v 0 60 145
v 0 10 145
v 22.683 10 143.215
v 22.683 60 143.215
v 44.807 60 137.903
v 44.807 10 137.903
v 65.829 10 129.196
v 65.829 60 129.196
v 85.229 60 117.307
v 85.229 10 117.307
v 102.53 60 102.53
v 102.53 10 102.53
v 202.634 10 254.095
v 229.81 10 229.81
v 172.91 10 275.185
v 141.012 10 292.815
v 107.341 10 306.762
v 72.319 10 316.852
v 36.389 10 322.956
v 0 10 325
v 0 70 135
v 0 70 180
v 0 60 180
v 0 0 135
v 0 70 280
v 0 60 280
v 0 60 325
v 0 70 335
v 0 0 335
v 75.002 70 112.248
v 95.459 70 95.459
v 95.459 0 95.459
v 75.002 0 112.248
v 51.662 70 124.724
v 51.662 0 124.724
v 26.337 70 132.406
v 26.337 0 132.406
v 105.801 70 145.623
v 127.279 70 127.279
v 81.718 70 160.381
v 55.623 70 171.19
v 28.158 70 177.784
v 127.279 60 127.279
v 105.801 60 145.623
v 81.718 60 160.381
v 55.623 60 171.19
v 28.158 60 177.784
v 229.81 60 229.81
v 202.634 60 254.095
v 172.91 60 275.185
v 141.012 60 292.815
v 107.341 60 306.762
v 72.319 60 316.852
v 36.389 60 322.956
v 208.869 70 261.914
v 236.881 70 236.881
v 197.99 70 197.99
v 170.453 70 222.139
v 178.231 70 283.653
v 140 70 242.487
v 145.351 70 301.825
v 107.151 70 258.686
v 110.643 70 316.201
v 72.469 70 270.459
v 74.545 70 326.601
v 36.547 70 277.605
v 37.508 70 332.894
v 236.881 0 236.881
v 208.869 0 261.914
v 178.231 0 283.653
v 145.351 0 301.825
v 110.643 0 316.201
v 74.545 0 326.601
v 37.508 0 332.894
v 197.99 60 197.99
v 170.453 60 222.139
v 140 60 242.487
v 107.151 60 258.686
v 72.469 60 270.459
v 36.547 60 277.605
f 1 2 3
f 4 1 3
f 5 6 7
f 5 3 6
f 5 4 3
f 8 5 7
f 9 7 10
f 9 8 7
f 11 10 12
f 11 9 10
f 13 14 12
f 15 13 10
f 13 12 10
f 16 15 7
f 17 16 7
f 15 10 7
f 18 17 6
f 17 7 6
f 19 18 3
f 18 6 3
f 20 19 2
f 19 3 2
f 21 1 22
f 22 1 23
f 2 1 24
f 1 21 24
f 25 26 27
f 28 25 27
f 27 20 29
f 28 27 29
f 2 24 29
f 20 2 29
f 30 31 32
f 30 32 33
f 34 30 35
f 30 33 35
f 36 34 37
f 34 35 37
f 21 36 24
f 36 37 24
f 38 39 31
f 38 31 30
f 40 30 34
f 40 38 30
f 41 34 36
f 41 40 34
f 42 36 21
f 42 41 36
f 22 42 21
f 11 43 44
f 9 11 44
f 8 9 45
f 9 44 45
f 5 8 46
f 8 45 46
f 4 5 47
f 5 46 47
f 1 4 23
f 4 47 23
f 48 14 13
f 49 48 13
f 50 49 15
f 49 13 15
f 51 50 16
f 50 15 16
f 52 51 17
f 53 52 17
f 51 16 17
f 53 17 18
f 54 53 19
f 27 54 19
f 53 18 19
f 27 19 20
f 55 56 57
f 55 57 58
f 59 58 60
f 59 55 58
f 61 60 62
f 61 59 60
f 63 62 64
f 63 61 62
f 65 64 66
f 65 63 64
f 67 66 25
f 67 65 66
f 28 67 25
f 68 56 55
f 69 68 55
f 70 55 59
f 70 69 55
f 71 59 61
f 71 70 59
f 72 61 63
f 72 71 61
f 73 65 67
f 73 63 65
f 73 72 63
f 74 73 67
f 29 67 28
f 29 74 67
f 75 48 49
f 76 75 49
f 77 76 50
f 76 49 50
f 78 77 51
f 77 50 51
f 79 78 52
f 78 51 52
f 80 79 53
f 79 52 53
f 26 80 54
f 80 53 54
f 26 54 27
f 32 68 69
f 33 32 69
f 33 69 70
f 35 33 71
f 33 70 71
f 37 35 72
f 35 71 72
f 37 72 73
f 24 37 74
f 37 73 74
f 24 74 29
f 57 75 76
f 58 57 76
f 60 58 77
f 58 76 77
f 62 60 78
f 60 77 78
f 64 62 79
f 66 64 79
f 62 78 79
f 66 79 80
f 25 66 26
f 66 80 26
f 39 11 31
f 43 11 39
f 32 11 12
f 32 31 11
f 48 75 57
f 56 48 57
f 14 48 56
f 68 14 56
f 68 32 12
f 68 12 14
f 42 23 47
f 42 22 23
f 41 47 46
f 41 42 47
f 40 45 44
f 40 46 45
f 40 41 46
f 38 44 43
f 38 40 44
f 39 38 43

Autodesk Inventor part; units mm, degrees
ref_plane "YZ Plane" through (0, 0, 0) normal (1, 0, 0) x (0, 1, 0)
ref_plane "XZ Plane" through (0, 0, 0) normal (0, 1, 0) x (-1, 0, 0)
ref_plane "XY Plane" through (0, 0, 0) normal (0, 0, 1) x (1, 0, 0)
sketch "Sketch1" plane through (0, 0, 0) normal (0, 1, 0) x (-1, 0, 0)
  circle A0 centre (0, 0) radius 335
  line L0 (335, 0) -> (-335, 0)
  line L1 (0, -335) -> (0, 335)
  line L2 (0, 0) -> (-236.8808, 236.8808)
  line L3 (0, 0) -> (236.8808, -236.8808)
  line L4 (0, 0) -> (236.8808, 236.8808)
  line L5 (0, 0) -> (-236.8808, -236.8808)
  circle A1 centre (0, 0) radius 135
  point P0 (-95.4594, 95.4594)
  point P1 (0, 135)
  dimension "d0" = 670
  dimension "d1" = 45
  dimension "d2" = 45
  dimension "d17" = 200
extrude "Extrusion1" add sketch "Sketch1" along normal blind 70 contours L1 A1 L2 A0
sketch "Sketch2" plane through (95.4594, 0, 95.4594) normal (0.7071068, 0, -0.7071068) x (-0.7071068, 0, -0.7071068)
  line L0 (-190, 60) -> (-10, 60)
  line L1 (-10, 60) -> (-10, 10)
  line L2 (-10, 10) -> (-190, 10)
  line L3 (-190, 10) -> (-190, 60)
  line L4 (-200, 0) -> (0, 0) projected
  line L5 (-200, 70) -> (0, 70) projected
  line L6 (-200, 0) -> (-200, 70) projected
  line L7 (0, 0) -> (0, 70) projected
  point P0 (135, 0)
  point P1 (0, 35)
  dimension "d6" = 10
  dimension "d7" = 10
  dimension "d8" = 10
  dimension "d9" = 10
sketch3d "3D Sketch1"
  arc A0 (95.4594, 70, 95.4594) -> (0, 70, 135) centre (0, 70, 0) ccw
sweep "Sweep1" cut profiles "Sketch2" path "3D Sketch1" contours L0 L1 L2 L3
sketch "Sketch3" plane through (95.4594, 0, 95.4594) normal (0.7071068, 0, -0.7071068) x (-0.7071068, 0, -0.7071068)
  line L0 (-101.8808, 70) -> (-200, 70) projected
  line L1 (32.4695, 60) -> (-94.8097, 60) projected
  line L2 (-145, 70) -> (-45, 70)
  line L3 (-45, 70) -> (-45, 60)
  line L4 (-45, 60) -> (-145, 60)
  line L5 (-145, 60) -> (-145, 70)
  line L6 (-200, 0) -> (-200, 70) projected
  line L7 (0, 0) -> (0, 70) projected
  point P0 (135, 0)
  dimension "d16" = 100
  dimension "d18" = 45
sketch3d "3D Sketch2"
  arc A0 (95.4594, 70, 95.4594) -> (0, 70, 135) centre (0, 70, 0) ccw
sweep "Sweep2" cut profiles "Sketch3" path "3D Sketch2"
properties part number "Carousel Fixed Track"
